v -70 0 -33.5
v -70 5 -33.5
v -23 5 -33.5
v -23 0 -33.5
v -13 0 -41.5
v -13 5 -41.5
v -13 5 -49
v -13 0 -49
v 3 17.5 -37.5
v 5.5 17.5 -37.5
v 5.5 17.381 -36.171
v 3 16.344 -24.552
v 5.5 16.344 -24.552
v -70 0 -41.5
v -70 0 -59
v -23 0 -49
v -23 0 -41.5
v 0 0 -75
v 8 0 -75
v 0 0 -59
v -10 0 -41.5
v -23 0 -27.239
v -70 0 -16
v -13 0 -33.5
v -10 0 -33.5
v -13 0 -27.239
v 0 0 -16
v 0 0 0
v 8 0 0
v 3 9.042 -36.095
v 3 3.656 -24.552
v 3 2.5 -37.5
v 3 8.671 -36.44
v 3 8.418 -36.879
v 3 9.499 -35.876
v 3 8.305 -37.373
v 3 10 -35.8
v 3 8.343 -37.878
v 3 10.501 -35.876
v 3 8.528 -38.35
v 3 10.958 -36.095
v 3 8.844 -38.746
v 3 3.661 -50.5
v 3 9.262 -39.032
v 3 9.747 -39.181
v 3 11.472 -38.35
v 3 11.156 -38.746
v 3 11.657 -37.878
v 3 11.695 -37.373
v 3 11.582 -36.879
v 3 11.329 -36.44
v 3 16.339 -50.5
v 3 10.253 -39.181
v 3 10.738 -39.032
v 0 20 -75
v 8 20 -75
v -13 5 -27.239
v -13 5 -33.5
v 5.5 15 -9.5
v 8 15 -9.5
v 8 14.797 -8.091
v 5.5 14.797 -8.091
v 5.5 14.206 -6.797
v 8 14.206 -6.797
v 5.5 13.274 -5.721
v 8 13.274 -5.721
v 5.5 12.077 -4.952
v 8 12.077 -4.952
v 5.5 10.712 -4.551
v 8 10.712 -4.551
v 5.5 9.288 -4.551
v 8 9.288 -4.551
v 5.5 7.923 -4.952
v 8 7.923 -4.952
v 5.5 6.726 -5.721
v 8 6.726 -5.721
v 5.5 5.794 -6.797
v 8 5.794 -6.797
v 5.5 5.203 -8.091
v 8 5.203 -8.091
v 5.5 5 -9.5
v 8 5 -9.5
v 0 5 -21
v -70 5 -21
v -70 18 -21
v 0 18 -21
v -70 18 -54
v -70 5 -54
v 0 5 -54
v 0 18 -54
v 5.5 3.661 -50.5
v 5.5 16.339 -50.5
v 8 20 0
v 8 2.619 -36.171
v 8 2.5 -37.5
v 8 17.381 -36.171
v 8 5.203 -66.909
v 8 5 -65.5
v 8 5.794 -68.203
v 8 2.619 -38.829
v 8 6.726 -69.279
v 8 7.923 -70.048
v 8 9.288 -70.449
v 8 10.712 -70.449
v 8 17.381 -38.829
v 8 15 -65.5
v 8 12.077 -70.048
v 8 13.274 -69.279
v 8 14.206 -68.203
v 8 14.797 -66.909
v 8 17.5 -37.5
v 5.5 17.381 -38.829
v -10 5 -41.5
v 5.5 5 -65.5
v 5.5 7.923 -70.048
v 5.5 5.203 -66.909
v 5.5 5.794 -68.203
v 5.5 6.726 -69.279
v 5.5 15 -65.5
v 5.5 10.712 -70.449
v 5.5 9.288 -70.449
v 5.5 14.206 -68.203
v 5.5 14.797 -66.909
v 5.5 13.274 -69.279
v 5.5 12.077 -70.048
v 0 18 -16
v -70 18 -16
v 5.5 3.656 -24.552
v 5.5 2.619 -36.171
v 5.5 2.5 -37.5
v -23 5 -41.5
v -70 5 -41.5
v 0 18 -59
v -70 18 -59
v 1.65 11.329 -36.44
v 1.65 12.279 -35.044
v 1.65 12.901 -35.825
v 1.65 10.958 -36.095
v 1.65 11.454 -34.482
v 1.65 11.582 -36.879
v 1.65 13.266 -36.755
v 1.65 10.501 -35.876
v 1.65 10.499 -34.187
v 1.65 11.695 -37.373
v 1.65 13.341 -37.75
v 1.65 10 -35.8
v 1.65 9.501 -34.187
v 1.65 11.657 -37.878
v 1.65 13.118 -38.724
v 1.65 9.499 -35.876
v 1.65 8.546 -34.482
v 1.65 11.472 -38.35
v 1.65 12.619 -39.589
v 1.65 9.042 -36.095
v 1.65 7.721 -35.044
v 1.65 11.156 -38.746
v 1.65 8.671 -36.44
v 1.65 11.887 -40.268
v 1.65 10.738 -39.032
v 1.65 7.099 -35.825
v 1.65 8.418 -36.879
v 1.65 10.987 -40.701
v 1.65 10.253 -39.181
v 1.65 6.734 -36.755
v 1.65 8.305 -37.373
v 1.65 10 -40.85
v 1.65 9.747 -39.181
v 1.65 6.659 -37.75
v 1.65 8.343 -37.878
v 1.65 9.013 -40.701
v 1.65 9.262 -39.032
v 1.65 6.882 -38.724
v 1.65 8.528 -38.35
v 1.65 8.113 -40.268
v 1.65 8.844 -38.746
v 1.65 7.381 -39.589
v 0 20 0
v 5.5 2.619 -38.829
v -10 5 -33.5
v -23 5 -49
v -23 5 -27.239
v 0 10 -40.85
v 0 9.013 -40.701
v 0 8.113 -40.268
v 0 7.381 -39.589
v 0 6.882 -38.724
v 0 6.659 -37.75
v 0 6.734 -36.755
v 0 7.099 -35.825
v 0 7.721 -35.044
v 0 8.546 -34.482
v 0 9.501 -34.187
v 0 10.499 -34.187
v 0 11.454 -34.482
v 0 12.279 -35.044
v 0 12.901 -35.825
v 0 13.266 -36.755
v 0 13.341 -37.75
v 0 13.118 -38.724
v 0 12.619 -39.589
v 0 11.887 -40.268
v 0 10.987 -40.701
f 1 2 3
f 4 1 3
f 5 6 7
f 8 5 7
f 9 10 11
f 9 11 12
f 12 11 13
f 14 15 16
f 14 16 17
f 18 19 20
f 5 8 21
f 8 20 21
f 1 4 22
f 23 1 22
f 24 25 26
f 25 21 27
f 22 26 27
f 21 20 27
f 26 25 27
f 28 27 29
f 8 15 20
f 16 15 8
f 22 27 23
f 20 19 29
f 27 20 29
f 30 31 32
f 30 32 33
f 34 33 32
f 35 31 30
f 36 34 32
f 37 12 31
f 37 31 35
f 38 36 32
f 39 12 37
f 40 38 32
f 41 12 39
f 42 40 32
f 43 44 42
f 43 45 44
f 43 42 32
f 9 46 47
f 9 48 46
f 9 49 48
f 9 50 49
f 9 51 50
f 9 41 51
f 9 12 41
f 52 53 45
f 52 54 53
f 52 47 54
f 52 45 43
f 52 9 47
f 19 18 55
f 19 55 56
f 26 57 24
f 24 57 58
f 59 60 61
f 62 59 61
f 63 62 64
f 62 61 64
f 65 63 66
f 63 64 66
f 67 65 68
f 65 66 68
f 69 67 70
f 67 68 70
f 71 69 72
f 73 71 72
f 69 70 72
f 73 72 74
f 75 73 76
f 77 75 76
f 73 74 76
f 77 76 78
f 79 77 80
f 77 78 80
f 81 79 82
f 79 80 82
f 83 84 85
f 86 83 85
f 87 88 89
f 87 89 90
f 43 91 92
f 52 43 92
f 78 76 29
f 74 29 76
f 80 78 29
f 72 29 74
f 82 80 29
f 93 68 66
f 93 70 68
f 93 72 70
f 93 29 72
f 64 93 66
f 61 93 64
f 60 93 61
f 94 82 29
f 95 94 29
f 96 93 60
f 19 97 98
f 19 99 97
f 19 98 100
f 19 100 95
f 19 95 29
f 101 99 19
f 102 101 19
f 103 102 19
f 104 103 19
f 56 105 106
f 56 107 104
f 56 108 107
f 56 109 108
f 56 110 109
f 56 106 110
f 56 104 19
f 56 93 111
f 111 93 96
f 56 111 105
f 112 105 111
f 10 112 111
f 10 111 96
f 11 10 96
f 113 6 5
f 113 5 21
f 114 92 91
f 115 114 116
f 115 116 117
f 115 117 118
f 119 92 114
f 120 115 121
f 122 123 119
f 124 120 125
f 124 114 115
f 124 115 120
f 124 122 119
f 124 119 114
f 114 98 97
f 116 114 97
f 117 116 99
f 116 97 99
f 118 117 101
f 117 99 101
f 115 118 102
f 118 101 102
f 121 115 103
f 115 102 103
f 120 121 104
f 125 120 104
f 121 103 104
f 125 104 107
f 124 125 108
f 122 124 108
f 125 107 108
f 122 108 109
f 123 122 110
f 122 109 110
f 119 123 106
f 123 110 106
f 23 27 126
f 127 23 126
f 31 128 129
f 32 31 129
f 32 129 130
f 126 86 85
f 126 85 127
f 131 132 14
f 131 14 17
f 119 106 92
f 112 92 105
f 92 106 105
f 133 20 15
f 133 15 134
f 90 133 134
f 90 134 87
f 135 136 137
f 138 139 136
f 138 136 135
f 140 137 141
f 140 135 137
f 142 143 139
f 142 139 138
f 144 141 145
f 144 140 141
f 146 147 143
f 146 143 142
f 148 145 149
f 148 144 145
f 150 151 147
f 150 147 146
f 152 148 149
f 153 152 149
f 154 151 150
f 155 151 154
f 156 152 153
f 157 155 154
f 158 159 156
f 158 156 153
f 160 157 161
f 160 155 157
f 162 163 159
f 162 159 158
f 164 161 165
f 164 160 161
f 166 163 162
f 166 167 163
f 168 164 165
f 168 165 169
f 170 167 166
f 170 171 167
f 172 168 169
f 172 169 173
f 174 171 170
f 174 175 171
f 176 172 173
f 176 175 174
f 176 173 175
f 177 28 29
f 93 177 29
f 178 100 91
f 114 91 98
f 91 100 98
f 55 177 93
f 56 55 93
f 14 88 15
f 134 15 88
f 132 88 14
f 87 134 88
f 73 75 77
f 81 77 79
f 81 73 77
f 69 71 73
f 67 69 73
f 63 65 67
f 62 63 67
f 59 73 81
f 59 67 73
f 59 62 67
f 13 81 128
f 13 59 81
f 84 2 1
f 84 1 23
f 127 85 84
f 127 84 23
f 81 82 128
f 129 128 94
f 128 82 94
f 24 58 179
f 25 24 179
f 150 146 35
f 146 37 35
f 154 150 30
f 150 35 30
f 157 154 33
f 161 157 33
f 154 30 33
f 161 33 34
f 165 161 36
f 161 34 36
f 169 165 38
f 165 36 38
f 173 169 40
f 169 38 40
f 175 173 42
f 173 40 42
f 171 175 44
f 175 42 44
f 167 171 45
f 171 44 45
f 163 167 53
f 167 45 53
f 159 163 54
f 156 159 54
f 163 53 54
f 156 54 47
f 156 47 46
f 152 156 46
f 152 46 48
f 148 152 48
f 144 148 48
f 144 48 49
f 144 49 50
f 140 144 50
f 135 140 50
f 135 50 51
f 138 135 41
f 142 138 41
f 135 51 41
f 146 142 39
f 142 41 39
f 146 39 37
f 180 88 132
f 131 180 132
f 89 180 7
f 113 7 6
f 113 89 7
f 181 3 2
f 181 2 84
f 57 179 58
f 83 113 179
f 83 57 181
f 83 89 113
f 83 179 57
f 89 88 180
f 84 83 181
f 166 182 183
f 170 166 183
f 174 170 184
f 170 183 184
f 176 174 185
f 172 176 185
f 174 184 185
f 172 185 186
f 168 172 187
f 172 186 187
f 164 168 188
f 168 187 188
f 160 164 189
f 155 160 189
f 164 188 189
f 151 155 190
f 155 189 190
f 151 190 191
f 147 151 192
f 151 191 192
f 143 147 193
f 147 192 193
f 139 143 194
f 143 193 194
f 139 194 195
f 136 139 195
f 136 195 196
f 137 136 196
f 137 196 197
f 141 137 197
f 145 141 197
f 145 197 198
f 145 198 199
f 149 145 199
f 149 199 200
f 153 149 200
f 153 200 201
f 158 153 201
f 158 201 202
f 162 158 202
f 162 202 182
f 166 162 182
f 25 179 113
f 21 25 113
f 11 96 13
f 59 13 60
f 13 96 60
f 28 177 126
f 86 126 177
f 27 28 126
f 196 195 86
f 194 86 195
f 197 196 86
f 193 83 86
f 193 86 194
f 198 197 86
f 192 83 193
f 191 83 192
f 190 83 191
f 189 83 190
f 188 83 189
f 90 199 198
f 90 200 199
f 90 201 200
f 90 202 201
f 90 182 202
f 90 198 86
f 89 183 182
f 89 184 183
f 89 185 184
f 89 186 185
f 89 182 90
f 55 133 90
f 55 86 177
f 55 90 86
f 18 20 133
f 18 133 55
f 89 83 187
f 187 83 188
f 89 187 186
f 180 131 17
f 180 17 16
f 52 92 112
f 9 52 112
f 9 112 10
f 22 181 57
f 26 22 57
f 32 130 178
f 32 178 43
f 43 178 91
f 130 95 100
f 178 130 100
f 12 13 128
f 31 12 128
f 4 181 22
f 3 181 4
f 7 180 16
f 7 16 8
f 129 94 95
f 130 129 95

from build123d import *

# Parameters (mm, degrees)
SKETCH_1_W                   = 10
SKETCH_1_H                   = 75
EXTRUDE_2_DEPTH              = 20
SKETCH_4_W                   = 75
SKETCH_4_H                   = 20
CUT_EXTRUDE_3_DEPTH          = 2
CUT_EXTRUDE_4_DEPTH          = 2.5
CUT_EXTRUDE_5_DEPTH          = 5
SKETCH_10_W                  = 33
SKETCH_10_H                  = 5
EXTRUDE_3_DEPTH              = 70
SKETCH_11_W                  = 5
SKETCH_11_H                  = 18
EXTRUDE_4_DEPTH              = 70
SKETCH_12_W                  = 5
SKETCH_12_H                  = 18
EXTRUDE_5_DEPTH              = 70
SKETCH_13_W                  = 60
SKETCH_13_H                  = 8
CUT_EXTRUDE_6_DEPTH          = 20
SKETCH_14_W                  = 10
SKETCH_14_H                  = 21.760680977
CUT_EXTRUDE_7_DEPTH          = 20
HOLE_WIZARD_M3_1_D           = 3.4
HOLE_WIZARD_M3_1_DEPTH       = 20
HOLE_WIZARD_M3_1_CBORE_D     = 6.7
HOLE_WIZARD_M3_1_CBORE_DEPTH = 1.65
HOLE_WIZARD_M3_1_TIP         = 1.021463052


with BuildPart() as part:
    # 草图1 → 凸台-拉伸2 (new body)
    with BuildSketch(Plane(origin=(0, 0, 0), x_dir=(1, 0, 0), z_dir=(0, 1, 0))):
        with Locations((5, 37.5)):
            Rectangle(SKETCH_1_W, SKETCH_1_H)
    extrude(amount=EXTRUDE_2_DEPTH)

    # 草图4 → 切除-拉伸3 (cut)
    with BuildSketch(Plane(origin=(10, 0, 0), x_dir=(0, 0, -1), z_dir=(1, 0, 0))):
        with Locations((37.5, 10)):
            Rectangle(SKETCH_4_W, SKETCH_4_H)
    extrude(amount=-CUT_EXTRUDE_3_DEPTH, mode=Mode.SUBTRACT)

    # 草图5 → 切除-拉伸4 (cut)
    with BuildSketch(Plane(origin=(8, 0, 0), x_dir=(0, 0, -1), z_dir=(1, 0, 0))):
        with BuildLine():
            Line((65.5, 15), (38.828693451, 17.381366656))
            ThreePointArc((38.828693451, 17.381366656), (43.253920441, 14.810654795), (45, 10))
            ThreePointArc((45, 10), (43.253920441, 5.189345205), (38.828693451, 2.618633344))
            Line((38.828693451, 2.618633344), (65.5, 5))
            ThreePointArc((65.5, 5), (70.5, 10), (65.5, 15))
        make_face()
        with BuildLine():
            Line((37.5, 17.5), (36.171306549, 17.381366656))
            ThreePointArc((36.171306549, 17.381366656), (30, 10), (36.171306549, 2.618633344))
            Line((36.171306549, 2.618633344), (37.5, 2.5))
            Line((37.5, 2.5), (38.828693451, 2.618633344))
            ThreePointArc((38.828693451, 2.618633344), (43.253920441, 5.189345205), (45, 10))
            ThreePointArc((45, 10), (43.253920441, 14.810654795), (38.828693451, 17.381366656))
            Line((38.828693451, 17.381366656), (37.5, 17.5))
        make_face()
        with BuildLine():
            Line((36.171306549, 17.381366656), (9.5, 15))
            ThreePointArc((9.5, 15), (4.5, 10), (9.5, 5))
            Line((9.5, 5), (36.171306549, 2.618633344))
            ThreePointArc((36.171306549, 2.618633344), (30, 10), (36.171306549, 17.381366656))
        make_face()
    extrude(amount=-CUT_EXTRUDE_4_DEPTH, mode=Mode.SUBTRACT)

    # 草图6 → 切除-拉伸5 (cut)
    with BuildSketch(Plane(origin=(8, 0, 0), x_dir=(0, 0, -1), z_dir=(1, 0, 0))):
        Polygon((37.5, 17.5), (24.551509831, 16.343884806), (24.551509831, 3.656115194), (37.5, 2.5), (50.5, 3.660714286), (50.5, 16.339285714), align=None)
    extrude(amount=-CUT_EXTRUDE_5_DEPTH, mode=Mode.SUBTRACT)

    # 草图10 → 凸台-拉伸3 (add)
    with BuildSketch(Plane.ZY):
        with Locations((-37.5, 2.5)):
            Rectangle(SKETCH_10_W, SKETCH_10_H)
    extrude(amount=EXTRUDE_3_DEPTH)

    # 草图11 → 凸台-拉伸4 (add)
    with BuildSketch(Plane.ZY):
        with Locations((-18.5, 9)):
            Rectangle(SKETCH_11_W, SKETCH_11_H)
    extrude(amount=EXTRUDE_4_DEPTH)

    # 草图12 → 凸台-拉伸5 (add)
    with BuildSketch(Plane.ZY):
        with Locations((-56.5, 9)):
            Rectangle(SKETCH_12_W, SKETCH_12_H)
    extrude(amount=EXTRUDE_5_DEPTH)

    # 草图13 → 切除-拉伸6 (cut)
    with BuildSketch(Plane(origin=(0, 5, 0), x_dir=(1, 0, 0), z_dir=(0, 1, 0))):
        with Locations((-40, 37.5)):
            Rectangle(SKETCH_13_W, SKETCH_13_H)
    extrude(amount=-CUT_EXTRUDE_6_DEPTH, mode=Mode.SUBTRACT)

    # 草图14 → 切除-拉伸7 (cut)
    with BuildSketch(Plane(origin=(0, 5, 0), x_dir=(1, 0, 0), z_dir=(0, 1, 0))):
        with Locations((-18, 38.119659512)):
            Rectangle(SKETCH_14_W, SKETCH_14_H)
    extrude(amount=-CUT_EXTRUDE_7_DEPTH, mode=Mode.SUBTRACT)

    # M3 凹圆头螺钉的柱形沉头孔1
    with Locations(Plane(origin=(0, 10, -37.5), x_dir=(0, 0, -1), z_dir=(-1, 0, 0))):
        with Locations((0, 0)):
            CounterBoreHole(HOLE_WIZARD_M3_1_D / 2, HOLE_WIZARD_M3_1_CBORE_D / 2, HOLE_WIZARD_M3_1_CBORE_DEPTH, depth=HOLE_WIZARD_M3_1_DEPTH)
            with Locations((0, 0, -(HOLE_WIZARD_M3_1_DEPTH + HOLE_WIZARD_M3_1_TIP / 2))):  # 118° drill point
                Cone(0, HOLE_WIZARD_M3_1_D / 2, HOLE_WIZARD_M3_1_TIP, mode=Mode.SUBTRACT)


solid = part.part
